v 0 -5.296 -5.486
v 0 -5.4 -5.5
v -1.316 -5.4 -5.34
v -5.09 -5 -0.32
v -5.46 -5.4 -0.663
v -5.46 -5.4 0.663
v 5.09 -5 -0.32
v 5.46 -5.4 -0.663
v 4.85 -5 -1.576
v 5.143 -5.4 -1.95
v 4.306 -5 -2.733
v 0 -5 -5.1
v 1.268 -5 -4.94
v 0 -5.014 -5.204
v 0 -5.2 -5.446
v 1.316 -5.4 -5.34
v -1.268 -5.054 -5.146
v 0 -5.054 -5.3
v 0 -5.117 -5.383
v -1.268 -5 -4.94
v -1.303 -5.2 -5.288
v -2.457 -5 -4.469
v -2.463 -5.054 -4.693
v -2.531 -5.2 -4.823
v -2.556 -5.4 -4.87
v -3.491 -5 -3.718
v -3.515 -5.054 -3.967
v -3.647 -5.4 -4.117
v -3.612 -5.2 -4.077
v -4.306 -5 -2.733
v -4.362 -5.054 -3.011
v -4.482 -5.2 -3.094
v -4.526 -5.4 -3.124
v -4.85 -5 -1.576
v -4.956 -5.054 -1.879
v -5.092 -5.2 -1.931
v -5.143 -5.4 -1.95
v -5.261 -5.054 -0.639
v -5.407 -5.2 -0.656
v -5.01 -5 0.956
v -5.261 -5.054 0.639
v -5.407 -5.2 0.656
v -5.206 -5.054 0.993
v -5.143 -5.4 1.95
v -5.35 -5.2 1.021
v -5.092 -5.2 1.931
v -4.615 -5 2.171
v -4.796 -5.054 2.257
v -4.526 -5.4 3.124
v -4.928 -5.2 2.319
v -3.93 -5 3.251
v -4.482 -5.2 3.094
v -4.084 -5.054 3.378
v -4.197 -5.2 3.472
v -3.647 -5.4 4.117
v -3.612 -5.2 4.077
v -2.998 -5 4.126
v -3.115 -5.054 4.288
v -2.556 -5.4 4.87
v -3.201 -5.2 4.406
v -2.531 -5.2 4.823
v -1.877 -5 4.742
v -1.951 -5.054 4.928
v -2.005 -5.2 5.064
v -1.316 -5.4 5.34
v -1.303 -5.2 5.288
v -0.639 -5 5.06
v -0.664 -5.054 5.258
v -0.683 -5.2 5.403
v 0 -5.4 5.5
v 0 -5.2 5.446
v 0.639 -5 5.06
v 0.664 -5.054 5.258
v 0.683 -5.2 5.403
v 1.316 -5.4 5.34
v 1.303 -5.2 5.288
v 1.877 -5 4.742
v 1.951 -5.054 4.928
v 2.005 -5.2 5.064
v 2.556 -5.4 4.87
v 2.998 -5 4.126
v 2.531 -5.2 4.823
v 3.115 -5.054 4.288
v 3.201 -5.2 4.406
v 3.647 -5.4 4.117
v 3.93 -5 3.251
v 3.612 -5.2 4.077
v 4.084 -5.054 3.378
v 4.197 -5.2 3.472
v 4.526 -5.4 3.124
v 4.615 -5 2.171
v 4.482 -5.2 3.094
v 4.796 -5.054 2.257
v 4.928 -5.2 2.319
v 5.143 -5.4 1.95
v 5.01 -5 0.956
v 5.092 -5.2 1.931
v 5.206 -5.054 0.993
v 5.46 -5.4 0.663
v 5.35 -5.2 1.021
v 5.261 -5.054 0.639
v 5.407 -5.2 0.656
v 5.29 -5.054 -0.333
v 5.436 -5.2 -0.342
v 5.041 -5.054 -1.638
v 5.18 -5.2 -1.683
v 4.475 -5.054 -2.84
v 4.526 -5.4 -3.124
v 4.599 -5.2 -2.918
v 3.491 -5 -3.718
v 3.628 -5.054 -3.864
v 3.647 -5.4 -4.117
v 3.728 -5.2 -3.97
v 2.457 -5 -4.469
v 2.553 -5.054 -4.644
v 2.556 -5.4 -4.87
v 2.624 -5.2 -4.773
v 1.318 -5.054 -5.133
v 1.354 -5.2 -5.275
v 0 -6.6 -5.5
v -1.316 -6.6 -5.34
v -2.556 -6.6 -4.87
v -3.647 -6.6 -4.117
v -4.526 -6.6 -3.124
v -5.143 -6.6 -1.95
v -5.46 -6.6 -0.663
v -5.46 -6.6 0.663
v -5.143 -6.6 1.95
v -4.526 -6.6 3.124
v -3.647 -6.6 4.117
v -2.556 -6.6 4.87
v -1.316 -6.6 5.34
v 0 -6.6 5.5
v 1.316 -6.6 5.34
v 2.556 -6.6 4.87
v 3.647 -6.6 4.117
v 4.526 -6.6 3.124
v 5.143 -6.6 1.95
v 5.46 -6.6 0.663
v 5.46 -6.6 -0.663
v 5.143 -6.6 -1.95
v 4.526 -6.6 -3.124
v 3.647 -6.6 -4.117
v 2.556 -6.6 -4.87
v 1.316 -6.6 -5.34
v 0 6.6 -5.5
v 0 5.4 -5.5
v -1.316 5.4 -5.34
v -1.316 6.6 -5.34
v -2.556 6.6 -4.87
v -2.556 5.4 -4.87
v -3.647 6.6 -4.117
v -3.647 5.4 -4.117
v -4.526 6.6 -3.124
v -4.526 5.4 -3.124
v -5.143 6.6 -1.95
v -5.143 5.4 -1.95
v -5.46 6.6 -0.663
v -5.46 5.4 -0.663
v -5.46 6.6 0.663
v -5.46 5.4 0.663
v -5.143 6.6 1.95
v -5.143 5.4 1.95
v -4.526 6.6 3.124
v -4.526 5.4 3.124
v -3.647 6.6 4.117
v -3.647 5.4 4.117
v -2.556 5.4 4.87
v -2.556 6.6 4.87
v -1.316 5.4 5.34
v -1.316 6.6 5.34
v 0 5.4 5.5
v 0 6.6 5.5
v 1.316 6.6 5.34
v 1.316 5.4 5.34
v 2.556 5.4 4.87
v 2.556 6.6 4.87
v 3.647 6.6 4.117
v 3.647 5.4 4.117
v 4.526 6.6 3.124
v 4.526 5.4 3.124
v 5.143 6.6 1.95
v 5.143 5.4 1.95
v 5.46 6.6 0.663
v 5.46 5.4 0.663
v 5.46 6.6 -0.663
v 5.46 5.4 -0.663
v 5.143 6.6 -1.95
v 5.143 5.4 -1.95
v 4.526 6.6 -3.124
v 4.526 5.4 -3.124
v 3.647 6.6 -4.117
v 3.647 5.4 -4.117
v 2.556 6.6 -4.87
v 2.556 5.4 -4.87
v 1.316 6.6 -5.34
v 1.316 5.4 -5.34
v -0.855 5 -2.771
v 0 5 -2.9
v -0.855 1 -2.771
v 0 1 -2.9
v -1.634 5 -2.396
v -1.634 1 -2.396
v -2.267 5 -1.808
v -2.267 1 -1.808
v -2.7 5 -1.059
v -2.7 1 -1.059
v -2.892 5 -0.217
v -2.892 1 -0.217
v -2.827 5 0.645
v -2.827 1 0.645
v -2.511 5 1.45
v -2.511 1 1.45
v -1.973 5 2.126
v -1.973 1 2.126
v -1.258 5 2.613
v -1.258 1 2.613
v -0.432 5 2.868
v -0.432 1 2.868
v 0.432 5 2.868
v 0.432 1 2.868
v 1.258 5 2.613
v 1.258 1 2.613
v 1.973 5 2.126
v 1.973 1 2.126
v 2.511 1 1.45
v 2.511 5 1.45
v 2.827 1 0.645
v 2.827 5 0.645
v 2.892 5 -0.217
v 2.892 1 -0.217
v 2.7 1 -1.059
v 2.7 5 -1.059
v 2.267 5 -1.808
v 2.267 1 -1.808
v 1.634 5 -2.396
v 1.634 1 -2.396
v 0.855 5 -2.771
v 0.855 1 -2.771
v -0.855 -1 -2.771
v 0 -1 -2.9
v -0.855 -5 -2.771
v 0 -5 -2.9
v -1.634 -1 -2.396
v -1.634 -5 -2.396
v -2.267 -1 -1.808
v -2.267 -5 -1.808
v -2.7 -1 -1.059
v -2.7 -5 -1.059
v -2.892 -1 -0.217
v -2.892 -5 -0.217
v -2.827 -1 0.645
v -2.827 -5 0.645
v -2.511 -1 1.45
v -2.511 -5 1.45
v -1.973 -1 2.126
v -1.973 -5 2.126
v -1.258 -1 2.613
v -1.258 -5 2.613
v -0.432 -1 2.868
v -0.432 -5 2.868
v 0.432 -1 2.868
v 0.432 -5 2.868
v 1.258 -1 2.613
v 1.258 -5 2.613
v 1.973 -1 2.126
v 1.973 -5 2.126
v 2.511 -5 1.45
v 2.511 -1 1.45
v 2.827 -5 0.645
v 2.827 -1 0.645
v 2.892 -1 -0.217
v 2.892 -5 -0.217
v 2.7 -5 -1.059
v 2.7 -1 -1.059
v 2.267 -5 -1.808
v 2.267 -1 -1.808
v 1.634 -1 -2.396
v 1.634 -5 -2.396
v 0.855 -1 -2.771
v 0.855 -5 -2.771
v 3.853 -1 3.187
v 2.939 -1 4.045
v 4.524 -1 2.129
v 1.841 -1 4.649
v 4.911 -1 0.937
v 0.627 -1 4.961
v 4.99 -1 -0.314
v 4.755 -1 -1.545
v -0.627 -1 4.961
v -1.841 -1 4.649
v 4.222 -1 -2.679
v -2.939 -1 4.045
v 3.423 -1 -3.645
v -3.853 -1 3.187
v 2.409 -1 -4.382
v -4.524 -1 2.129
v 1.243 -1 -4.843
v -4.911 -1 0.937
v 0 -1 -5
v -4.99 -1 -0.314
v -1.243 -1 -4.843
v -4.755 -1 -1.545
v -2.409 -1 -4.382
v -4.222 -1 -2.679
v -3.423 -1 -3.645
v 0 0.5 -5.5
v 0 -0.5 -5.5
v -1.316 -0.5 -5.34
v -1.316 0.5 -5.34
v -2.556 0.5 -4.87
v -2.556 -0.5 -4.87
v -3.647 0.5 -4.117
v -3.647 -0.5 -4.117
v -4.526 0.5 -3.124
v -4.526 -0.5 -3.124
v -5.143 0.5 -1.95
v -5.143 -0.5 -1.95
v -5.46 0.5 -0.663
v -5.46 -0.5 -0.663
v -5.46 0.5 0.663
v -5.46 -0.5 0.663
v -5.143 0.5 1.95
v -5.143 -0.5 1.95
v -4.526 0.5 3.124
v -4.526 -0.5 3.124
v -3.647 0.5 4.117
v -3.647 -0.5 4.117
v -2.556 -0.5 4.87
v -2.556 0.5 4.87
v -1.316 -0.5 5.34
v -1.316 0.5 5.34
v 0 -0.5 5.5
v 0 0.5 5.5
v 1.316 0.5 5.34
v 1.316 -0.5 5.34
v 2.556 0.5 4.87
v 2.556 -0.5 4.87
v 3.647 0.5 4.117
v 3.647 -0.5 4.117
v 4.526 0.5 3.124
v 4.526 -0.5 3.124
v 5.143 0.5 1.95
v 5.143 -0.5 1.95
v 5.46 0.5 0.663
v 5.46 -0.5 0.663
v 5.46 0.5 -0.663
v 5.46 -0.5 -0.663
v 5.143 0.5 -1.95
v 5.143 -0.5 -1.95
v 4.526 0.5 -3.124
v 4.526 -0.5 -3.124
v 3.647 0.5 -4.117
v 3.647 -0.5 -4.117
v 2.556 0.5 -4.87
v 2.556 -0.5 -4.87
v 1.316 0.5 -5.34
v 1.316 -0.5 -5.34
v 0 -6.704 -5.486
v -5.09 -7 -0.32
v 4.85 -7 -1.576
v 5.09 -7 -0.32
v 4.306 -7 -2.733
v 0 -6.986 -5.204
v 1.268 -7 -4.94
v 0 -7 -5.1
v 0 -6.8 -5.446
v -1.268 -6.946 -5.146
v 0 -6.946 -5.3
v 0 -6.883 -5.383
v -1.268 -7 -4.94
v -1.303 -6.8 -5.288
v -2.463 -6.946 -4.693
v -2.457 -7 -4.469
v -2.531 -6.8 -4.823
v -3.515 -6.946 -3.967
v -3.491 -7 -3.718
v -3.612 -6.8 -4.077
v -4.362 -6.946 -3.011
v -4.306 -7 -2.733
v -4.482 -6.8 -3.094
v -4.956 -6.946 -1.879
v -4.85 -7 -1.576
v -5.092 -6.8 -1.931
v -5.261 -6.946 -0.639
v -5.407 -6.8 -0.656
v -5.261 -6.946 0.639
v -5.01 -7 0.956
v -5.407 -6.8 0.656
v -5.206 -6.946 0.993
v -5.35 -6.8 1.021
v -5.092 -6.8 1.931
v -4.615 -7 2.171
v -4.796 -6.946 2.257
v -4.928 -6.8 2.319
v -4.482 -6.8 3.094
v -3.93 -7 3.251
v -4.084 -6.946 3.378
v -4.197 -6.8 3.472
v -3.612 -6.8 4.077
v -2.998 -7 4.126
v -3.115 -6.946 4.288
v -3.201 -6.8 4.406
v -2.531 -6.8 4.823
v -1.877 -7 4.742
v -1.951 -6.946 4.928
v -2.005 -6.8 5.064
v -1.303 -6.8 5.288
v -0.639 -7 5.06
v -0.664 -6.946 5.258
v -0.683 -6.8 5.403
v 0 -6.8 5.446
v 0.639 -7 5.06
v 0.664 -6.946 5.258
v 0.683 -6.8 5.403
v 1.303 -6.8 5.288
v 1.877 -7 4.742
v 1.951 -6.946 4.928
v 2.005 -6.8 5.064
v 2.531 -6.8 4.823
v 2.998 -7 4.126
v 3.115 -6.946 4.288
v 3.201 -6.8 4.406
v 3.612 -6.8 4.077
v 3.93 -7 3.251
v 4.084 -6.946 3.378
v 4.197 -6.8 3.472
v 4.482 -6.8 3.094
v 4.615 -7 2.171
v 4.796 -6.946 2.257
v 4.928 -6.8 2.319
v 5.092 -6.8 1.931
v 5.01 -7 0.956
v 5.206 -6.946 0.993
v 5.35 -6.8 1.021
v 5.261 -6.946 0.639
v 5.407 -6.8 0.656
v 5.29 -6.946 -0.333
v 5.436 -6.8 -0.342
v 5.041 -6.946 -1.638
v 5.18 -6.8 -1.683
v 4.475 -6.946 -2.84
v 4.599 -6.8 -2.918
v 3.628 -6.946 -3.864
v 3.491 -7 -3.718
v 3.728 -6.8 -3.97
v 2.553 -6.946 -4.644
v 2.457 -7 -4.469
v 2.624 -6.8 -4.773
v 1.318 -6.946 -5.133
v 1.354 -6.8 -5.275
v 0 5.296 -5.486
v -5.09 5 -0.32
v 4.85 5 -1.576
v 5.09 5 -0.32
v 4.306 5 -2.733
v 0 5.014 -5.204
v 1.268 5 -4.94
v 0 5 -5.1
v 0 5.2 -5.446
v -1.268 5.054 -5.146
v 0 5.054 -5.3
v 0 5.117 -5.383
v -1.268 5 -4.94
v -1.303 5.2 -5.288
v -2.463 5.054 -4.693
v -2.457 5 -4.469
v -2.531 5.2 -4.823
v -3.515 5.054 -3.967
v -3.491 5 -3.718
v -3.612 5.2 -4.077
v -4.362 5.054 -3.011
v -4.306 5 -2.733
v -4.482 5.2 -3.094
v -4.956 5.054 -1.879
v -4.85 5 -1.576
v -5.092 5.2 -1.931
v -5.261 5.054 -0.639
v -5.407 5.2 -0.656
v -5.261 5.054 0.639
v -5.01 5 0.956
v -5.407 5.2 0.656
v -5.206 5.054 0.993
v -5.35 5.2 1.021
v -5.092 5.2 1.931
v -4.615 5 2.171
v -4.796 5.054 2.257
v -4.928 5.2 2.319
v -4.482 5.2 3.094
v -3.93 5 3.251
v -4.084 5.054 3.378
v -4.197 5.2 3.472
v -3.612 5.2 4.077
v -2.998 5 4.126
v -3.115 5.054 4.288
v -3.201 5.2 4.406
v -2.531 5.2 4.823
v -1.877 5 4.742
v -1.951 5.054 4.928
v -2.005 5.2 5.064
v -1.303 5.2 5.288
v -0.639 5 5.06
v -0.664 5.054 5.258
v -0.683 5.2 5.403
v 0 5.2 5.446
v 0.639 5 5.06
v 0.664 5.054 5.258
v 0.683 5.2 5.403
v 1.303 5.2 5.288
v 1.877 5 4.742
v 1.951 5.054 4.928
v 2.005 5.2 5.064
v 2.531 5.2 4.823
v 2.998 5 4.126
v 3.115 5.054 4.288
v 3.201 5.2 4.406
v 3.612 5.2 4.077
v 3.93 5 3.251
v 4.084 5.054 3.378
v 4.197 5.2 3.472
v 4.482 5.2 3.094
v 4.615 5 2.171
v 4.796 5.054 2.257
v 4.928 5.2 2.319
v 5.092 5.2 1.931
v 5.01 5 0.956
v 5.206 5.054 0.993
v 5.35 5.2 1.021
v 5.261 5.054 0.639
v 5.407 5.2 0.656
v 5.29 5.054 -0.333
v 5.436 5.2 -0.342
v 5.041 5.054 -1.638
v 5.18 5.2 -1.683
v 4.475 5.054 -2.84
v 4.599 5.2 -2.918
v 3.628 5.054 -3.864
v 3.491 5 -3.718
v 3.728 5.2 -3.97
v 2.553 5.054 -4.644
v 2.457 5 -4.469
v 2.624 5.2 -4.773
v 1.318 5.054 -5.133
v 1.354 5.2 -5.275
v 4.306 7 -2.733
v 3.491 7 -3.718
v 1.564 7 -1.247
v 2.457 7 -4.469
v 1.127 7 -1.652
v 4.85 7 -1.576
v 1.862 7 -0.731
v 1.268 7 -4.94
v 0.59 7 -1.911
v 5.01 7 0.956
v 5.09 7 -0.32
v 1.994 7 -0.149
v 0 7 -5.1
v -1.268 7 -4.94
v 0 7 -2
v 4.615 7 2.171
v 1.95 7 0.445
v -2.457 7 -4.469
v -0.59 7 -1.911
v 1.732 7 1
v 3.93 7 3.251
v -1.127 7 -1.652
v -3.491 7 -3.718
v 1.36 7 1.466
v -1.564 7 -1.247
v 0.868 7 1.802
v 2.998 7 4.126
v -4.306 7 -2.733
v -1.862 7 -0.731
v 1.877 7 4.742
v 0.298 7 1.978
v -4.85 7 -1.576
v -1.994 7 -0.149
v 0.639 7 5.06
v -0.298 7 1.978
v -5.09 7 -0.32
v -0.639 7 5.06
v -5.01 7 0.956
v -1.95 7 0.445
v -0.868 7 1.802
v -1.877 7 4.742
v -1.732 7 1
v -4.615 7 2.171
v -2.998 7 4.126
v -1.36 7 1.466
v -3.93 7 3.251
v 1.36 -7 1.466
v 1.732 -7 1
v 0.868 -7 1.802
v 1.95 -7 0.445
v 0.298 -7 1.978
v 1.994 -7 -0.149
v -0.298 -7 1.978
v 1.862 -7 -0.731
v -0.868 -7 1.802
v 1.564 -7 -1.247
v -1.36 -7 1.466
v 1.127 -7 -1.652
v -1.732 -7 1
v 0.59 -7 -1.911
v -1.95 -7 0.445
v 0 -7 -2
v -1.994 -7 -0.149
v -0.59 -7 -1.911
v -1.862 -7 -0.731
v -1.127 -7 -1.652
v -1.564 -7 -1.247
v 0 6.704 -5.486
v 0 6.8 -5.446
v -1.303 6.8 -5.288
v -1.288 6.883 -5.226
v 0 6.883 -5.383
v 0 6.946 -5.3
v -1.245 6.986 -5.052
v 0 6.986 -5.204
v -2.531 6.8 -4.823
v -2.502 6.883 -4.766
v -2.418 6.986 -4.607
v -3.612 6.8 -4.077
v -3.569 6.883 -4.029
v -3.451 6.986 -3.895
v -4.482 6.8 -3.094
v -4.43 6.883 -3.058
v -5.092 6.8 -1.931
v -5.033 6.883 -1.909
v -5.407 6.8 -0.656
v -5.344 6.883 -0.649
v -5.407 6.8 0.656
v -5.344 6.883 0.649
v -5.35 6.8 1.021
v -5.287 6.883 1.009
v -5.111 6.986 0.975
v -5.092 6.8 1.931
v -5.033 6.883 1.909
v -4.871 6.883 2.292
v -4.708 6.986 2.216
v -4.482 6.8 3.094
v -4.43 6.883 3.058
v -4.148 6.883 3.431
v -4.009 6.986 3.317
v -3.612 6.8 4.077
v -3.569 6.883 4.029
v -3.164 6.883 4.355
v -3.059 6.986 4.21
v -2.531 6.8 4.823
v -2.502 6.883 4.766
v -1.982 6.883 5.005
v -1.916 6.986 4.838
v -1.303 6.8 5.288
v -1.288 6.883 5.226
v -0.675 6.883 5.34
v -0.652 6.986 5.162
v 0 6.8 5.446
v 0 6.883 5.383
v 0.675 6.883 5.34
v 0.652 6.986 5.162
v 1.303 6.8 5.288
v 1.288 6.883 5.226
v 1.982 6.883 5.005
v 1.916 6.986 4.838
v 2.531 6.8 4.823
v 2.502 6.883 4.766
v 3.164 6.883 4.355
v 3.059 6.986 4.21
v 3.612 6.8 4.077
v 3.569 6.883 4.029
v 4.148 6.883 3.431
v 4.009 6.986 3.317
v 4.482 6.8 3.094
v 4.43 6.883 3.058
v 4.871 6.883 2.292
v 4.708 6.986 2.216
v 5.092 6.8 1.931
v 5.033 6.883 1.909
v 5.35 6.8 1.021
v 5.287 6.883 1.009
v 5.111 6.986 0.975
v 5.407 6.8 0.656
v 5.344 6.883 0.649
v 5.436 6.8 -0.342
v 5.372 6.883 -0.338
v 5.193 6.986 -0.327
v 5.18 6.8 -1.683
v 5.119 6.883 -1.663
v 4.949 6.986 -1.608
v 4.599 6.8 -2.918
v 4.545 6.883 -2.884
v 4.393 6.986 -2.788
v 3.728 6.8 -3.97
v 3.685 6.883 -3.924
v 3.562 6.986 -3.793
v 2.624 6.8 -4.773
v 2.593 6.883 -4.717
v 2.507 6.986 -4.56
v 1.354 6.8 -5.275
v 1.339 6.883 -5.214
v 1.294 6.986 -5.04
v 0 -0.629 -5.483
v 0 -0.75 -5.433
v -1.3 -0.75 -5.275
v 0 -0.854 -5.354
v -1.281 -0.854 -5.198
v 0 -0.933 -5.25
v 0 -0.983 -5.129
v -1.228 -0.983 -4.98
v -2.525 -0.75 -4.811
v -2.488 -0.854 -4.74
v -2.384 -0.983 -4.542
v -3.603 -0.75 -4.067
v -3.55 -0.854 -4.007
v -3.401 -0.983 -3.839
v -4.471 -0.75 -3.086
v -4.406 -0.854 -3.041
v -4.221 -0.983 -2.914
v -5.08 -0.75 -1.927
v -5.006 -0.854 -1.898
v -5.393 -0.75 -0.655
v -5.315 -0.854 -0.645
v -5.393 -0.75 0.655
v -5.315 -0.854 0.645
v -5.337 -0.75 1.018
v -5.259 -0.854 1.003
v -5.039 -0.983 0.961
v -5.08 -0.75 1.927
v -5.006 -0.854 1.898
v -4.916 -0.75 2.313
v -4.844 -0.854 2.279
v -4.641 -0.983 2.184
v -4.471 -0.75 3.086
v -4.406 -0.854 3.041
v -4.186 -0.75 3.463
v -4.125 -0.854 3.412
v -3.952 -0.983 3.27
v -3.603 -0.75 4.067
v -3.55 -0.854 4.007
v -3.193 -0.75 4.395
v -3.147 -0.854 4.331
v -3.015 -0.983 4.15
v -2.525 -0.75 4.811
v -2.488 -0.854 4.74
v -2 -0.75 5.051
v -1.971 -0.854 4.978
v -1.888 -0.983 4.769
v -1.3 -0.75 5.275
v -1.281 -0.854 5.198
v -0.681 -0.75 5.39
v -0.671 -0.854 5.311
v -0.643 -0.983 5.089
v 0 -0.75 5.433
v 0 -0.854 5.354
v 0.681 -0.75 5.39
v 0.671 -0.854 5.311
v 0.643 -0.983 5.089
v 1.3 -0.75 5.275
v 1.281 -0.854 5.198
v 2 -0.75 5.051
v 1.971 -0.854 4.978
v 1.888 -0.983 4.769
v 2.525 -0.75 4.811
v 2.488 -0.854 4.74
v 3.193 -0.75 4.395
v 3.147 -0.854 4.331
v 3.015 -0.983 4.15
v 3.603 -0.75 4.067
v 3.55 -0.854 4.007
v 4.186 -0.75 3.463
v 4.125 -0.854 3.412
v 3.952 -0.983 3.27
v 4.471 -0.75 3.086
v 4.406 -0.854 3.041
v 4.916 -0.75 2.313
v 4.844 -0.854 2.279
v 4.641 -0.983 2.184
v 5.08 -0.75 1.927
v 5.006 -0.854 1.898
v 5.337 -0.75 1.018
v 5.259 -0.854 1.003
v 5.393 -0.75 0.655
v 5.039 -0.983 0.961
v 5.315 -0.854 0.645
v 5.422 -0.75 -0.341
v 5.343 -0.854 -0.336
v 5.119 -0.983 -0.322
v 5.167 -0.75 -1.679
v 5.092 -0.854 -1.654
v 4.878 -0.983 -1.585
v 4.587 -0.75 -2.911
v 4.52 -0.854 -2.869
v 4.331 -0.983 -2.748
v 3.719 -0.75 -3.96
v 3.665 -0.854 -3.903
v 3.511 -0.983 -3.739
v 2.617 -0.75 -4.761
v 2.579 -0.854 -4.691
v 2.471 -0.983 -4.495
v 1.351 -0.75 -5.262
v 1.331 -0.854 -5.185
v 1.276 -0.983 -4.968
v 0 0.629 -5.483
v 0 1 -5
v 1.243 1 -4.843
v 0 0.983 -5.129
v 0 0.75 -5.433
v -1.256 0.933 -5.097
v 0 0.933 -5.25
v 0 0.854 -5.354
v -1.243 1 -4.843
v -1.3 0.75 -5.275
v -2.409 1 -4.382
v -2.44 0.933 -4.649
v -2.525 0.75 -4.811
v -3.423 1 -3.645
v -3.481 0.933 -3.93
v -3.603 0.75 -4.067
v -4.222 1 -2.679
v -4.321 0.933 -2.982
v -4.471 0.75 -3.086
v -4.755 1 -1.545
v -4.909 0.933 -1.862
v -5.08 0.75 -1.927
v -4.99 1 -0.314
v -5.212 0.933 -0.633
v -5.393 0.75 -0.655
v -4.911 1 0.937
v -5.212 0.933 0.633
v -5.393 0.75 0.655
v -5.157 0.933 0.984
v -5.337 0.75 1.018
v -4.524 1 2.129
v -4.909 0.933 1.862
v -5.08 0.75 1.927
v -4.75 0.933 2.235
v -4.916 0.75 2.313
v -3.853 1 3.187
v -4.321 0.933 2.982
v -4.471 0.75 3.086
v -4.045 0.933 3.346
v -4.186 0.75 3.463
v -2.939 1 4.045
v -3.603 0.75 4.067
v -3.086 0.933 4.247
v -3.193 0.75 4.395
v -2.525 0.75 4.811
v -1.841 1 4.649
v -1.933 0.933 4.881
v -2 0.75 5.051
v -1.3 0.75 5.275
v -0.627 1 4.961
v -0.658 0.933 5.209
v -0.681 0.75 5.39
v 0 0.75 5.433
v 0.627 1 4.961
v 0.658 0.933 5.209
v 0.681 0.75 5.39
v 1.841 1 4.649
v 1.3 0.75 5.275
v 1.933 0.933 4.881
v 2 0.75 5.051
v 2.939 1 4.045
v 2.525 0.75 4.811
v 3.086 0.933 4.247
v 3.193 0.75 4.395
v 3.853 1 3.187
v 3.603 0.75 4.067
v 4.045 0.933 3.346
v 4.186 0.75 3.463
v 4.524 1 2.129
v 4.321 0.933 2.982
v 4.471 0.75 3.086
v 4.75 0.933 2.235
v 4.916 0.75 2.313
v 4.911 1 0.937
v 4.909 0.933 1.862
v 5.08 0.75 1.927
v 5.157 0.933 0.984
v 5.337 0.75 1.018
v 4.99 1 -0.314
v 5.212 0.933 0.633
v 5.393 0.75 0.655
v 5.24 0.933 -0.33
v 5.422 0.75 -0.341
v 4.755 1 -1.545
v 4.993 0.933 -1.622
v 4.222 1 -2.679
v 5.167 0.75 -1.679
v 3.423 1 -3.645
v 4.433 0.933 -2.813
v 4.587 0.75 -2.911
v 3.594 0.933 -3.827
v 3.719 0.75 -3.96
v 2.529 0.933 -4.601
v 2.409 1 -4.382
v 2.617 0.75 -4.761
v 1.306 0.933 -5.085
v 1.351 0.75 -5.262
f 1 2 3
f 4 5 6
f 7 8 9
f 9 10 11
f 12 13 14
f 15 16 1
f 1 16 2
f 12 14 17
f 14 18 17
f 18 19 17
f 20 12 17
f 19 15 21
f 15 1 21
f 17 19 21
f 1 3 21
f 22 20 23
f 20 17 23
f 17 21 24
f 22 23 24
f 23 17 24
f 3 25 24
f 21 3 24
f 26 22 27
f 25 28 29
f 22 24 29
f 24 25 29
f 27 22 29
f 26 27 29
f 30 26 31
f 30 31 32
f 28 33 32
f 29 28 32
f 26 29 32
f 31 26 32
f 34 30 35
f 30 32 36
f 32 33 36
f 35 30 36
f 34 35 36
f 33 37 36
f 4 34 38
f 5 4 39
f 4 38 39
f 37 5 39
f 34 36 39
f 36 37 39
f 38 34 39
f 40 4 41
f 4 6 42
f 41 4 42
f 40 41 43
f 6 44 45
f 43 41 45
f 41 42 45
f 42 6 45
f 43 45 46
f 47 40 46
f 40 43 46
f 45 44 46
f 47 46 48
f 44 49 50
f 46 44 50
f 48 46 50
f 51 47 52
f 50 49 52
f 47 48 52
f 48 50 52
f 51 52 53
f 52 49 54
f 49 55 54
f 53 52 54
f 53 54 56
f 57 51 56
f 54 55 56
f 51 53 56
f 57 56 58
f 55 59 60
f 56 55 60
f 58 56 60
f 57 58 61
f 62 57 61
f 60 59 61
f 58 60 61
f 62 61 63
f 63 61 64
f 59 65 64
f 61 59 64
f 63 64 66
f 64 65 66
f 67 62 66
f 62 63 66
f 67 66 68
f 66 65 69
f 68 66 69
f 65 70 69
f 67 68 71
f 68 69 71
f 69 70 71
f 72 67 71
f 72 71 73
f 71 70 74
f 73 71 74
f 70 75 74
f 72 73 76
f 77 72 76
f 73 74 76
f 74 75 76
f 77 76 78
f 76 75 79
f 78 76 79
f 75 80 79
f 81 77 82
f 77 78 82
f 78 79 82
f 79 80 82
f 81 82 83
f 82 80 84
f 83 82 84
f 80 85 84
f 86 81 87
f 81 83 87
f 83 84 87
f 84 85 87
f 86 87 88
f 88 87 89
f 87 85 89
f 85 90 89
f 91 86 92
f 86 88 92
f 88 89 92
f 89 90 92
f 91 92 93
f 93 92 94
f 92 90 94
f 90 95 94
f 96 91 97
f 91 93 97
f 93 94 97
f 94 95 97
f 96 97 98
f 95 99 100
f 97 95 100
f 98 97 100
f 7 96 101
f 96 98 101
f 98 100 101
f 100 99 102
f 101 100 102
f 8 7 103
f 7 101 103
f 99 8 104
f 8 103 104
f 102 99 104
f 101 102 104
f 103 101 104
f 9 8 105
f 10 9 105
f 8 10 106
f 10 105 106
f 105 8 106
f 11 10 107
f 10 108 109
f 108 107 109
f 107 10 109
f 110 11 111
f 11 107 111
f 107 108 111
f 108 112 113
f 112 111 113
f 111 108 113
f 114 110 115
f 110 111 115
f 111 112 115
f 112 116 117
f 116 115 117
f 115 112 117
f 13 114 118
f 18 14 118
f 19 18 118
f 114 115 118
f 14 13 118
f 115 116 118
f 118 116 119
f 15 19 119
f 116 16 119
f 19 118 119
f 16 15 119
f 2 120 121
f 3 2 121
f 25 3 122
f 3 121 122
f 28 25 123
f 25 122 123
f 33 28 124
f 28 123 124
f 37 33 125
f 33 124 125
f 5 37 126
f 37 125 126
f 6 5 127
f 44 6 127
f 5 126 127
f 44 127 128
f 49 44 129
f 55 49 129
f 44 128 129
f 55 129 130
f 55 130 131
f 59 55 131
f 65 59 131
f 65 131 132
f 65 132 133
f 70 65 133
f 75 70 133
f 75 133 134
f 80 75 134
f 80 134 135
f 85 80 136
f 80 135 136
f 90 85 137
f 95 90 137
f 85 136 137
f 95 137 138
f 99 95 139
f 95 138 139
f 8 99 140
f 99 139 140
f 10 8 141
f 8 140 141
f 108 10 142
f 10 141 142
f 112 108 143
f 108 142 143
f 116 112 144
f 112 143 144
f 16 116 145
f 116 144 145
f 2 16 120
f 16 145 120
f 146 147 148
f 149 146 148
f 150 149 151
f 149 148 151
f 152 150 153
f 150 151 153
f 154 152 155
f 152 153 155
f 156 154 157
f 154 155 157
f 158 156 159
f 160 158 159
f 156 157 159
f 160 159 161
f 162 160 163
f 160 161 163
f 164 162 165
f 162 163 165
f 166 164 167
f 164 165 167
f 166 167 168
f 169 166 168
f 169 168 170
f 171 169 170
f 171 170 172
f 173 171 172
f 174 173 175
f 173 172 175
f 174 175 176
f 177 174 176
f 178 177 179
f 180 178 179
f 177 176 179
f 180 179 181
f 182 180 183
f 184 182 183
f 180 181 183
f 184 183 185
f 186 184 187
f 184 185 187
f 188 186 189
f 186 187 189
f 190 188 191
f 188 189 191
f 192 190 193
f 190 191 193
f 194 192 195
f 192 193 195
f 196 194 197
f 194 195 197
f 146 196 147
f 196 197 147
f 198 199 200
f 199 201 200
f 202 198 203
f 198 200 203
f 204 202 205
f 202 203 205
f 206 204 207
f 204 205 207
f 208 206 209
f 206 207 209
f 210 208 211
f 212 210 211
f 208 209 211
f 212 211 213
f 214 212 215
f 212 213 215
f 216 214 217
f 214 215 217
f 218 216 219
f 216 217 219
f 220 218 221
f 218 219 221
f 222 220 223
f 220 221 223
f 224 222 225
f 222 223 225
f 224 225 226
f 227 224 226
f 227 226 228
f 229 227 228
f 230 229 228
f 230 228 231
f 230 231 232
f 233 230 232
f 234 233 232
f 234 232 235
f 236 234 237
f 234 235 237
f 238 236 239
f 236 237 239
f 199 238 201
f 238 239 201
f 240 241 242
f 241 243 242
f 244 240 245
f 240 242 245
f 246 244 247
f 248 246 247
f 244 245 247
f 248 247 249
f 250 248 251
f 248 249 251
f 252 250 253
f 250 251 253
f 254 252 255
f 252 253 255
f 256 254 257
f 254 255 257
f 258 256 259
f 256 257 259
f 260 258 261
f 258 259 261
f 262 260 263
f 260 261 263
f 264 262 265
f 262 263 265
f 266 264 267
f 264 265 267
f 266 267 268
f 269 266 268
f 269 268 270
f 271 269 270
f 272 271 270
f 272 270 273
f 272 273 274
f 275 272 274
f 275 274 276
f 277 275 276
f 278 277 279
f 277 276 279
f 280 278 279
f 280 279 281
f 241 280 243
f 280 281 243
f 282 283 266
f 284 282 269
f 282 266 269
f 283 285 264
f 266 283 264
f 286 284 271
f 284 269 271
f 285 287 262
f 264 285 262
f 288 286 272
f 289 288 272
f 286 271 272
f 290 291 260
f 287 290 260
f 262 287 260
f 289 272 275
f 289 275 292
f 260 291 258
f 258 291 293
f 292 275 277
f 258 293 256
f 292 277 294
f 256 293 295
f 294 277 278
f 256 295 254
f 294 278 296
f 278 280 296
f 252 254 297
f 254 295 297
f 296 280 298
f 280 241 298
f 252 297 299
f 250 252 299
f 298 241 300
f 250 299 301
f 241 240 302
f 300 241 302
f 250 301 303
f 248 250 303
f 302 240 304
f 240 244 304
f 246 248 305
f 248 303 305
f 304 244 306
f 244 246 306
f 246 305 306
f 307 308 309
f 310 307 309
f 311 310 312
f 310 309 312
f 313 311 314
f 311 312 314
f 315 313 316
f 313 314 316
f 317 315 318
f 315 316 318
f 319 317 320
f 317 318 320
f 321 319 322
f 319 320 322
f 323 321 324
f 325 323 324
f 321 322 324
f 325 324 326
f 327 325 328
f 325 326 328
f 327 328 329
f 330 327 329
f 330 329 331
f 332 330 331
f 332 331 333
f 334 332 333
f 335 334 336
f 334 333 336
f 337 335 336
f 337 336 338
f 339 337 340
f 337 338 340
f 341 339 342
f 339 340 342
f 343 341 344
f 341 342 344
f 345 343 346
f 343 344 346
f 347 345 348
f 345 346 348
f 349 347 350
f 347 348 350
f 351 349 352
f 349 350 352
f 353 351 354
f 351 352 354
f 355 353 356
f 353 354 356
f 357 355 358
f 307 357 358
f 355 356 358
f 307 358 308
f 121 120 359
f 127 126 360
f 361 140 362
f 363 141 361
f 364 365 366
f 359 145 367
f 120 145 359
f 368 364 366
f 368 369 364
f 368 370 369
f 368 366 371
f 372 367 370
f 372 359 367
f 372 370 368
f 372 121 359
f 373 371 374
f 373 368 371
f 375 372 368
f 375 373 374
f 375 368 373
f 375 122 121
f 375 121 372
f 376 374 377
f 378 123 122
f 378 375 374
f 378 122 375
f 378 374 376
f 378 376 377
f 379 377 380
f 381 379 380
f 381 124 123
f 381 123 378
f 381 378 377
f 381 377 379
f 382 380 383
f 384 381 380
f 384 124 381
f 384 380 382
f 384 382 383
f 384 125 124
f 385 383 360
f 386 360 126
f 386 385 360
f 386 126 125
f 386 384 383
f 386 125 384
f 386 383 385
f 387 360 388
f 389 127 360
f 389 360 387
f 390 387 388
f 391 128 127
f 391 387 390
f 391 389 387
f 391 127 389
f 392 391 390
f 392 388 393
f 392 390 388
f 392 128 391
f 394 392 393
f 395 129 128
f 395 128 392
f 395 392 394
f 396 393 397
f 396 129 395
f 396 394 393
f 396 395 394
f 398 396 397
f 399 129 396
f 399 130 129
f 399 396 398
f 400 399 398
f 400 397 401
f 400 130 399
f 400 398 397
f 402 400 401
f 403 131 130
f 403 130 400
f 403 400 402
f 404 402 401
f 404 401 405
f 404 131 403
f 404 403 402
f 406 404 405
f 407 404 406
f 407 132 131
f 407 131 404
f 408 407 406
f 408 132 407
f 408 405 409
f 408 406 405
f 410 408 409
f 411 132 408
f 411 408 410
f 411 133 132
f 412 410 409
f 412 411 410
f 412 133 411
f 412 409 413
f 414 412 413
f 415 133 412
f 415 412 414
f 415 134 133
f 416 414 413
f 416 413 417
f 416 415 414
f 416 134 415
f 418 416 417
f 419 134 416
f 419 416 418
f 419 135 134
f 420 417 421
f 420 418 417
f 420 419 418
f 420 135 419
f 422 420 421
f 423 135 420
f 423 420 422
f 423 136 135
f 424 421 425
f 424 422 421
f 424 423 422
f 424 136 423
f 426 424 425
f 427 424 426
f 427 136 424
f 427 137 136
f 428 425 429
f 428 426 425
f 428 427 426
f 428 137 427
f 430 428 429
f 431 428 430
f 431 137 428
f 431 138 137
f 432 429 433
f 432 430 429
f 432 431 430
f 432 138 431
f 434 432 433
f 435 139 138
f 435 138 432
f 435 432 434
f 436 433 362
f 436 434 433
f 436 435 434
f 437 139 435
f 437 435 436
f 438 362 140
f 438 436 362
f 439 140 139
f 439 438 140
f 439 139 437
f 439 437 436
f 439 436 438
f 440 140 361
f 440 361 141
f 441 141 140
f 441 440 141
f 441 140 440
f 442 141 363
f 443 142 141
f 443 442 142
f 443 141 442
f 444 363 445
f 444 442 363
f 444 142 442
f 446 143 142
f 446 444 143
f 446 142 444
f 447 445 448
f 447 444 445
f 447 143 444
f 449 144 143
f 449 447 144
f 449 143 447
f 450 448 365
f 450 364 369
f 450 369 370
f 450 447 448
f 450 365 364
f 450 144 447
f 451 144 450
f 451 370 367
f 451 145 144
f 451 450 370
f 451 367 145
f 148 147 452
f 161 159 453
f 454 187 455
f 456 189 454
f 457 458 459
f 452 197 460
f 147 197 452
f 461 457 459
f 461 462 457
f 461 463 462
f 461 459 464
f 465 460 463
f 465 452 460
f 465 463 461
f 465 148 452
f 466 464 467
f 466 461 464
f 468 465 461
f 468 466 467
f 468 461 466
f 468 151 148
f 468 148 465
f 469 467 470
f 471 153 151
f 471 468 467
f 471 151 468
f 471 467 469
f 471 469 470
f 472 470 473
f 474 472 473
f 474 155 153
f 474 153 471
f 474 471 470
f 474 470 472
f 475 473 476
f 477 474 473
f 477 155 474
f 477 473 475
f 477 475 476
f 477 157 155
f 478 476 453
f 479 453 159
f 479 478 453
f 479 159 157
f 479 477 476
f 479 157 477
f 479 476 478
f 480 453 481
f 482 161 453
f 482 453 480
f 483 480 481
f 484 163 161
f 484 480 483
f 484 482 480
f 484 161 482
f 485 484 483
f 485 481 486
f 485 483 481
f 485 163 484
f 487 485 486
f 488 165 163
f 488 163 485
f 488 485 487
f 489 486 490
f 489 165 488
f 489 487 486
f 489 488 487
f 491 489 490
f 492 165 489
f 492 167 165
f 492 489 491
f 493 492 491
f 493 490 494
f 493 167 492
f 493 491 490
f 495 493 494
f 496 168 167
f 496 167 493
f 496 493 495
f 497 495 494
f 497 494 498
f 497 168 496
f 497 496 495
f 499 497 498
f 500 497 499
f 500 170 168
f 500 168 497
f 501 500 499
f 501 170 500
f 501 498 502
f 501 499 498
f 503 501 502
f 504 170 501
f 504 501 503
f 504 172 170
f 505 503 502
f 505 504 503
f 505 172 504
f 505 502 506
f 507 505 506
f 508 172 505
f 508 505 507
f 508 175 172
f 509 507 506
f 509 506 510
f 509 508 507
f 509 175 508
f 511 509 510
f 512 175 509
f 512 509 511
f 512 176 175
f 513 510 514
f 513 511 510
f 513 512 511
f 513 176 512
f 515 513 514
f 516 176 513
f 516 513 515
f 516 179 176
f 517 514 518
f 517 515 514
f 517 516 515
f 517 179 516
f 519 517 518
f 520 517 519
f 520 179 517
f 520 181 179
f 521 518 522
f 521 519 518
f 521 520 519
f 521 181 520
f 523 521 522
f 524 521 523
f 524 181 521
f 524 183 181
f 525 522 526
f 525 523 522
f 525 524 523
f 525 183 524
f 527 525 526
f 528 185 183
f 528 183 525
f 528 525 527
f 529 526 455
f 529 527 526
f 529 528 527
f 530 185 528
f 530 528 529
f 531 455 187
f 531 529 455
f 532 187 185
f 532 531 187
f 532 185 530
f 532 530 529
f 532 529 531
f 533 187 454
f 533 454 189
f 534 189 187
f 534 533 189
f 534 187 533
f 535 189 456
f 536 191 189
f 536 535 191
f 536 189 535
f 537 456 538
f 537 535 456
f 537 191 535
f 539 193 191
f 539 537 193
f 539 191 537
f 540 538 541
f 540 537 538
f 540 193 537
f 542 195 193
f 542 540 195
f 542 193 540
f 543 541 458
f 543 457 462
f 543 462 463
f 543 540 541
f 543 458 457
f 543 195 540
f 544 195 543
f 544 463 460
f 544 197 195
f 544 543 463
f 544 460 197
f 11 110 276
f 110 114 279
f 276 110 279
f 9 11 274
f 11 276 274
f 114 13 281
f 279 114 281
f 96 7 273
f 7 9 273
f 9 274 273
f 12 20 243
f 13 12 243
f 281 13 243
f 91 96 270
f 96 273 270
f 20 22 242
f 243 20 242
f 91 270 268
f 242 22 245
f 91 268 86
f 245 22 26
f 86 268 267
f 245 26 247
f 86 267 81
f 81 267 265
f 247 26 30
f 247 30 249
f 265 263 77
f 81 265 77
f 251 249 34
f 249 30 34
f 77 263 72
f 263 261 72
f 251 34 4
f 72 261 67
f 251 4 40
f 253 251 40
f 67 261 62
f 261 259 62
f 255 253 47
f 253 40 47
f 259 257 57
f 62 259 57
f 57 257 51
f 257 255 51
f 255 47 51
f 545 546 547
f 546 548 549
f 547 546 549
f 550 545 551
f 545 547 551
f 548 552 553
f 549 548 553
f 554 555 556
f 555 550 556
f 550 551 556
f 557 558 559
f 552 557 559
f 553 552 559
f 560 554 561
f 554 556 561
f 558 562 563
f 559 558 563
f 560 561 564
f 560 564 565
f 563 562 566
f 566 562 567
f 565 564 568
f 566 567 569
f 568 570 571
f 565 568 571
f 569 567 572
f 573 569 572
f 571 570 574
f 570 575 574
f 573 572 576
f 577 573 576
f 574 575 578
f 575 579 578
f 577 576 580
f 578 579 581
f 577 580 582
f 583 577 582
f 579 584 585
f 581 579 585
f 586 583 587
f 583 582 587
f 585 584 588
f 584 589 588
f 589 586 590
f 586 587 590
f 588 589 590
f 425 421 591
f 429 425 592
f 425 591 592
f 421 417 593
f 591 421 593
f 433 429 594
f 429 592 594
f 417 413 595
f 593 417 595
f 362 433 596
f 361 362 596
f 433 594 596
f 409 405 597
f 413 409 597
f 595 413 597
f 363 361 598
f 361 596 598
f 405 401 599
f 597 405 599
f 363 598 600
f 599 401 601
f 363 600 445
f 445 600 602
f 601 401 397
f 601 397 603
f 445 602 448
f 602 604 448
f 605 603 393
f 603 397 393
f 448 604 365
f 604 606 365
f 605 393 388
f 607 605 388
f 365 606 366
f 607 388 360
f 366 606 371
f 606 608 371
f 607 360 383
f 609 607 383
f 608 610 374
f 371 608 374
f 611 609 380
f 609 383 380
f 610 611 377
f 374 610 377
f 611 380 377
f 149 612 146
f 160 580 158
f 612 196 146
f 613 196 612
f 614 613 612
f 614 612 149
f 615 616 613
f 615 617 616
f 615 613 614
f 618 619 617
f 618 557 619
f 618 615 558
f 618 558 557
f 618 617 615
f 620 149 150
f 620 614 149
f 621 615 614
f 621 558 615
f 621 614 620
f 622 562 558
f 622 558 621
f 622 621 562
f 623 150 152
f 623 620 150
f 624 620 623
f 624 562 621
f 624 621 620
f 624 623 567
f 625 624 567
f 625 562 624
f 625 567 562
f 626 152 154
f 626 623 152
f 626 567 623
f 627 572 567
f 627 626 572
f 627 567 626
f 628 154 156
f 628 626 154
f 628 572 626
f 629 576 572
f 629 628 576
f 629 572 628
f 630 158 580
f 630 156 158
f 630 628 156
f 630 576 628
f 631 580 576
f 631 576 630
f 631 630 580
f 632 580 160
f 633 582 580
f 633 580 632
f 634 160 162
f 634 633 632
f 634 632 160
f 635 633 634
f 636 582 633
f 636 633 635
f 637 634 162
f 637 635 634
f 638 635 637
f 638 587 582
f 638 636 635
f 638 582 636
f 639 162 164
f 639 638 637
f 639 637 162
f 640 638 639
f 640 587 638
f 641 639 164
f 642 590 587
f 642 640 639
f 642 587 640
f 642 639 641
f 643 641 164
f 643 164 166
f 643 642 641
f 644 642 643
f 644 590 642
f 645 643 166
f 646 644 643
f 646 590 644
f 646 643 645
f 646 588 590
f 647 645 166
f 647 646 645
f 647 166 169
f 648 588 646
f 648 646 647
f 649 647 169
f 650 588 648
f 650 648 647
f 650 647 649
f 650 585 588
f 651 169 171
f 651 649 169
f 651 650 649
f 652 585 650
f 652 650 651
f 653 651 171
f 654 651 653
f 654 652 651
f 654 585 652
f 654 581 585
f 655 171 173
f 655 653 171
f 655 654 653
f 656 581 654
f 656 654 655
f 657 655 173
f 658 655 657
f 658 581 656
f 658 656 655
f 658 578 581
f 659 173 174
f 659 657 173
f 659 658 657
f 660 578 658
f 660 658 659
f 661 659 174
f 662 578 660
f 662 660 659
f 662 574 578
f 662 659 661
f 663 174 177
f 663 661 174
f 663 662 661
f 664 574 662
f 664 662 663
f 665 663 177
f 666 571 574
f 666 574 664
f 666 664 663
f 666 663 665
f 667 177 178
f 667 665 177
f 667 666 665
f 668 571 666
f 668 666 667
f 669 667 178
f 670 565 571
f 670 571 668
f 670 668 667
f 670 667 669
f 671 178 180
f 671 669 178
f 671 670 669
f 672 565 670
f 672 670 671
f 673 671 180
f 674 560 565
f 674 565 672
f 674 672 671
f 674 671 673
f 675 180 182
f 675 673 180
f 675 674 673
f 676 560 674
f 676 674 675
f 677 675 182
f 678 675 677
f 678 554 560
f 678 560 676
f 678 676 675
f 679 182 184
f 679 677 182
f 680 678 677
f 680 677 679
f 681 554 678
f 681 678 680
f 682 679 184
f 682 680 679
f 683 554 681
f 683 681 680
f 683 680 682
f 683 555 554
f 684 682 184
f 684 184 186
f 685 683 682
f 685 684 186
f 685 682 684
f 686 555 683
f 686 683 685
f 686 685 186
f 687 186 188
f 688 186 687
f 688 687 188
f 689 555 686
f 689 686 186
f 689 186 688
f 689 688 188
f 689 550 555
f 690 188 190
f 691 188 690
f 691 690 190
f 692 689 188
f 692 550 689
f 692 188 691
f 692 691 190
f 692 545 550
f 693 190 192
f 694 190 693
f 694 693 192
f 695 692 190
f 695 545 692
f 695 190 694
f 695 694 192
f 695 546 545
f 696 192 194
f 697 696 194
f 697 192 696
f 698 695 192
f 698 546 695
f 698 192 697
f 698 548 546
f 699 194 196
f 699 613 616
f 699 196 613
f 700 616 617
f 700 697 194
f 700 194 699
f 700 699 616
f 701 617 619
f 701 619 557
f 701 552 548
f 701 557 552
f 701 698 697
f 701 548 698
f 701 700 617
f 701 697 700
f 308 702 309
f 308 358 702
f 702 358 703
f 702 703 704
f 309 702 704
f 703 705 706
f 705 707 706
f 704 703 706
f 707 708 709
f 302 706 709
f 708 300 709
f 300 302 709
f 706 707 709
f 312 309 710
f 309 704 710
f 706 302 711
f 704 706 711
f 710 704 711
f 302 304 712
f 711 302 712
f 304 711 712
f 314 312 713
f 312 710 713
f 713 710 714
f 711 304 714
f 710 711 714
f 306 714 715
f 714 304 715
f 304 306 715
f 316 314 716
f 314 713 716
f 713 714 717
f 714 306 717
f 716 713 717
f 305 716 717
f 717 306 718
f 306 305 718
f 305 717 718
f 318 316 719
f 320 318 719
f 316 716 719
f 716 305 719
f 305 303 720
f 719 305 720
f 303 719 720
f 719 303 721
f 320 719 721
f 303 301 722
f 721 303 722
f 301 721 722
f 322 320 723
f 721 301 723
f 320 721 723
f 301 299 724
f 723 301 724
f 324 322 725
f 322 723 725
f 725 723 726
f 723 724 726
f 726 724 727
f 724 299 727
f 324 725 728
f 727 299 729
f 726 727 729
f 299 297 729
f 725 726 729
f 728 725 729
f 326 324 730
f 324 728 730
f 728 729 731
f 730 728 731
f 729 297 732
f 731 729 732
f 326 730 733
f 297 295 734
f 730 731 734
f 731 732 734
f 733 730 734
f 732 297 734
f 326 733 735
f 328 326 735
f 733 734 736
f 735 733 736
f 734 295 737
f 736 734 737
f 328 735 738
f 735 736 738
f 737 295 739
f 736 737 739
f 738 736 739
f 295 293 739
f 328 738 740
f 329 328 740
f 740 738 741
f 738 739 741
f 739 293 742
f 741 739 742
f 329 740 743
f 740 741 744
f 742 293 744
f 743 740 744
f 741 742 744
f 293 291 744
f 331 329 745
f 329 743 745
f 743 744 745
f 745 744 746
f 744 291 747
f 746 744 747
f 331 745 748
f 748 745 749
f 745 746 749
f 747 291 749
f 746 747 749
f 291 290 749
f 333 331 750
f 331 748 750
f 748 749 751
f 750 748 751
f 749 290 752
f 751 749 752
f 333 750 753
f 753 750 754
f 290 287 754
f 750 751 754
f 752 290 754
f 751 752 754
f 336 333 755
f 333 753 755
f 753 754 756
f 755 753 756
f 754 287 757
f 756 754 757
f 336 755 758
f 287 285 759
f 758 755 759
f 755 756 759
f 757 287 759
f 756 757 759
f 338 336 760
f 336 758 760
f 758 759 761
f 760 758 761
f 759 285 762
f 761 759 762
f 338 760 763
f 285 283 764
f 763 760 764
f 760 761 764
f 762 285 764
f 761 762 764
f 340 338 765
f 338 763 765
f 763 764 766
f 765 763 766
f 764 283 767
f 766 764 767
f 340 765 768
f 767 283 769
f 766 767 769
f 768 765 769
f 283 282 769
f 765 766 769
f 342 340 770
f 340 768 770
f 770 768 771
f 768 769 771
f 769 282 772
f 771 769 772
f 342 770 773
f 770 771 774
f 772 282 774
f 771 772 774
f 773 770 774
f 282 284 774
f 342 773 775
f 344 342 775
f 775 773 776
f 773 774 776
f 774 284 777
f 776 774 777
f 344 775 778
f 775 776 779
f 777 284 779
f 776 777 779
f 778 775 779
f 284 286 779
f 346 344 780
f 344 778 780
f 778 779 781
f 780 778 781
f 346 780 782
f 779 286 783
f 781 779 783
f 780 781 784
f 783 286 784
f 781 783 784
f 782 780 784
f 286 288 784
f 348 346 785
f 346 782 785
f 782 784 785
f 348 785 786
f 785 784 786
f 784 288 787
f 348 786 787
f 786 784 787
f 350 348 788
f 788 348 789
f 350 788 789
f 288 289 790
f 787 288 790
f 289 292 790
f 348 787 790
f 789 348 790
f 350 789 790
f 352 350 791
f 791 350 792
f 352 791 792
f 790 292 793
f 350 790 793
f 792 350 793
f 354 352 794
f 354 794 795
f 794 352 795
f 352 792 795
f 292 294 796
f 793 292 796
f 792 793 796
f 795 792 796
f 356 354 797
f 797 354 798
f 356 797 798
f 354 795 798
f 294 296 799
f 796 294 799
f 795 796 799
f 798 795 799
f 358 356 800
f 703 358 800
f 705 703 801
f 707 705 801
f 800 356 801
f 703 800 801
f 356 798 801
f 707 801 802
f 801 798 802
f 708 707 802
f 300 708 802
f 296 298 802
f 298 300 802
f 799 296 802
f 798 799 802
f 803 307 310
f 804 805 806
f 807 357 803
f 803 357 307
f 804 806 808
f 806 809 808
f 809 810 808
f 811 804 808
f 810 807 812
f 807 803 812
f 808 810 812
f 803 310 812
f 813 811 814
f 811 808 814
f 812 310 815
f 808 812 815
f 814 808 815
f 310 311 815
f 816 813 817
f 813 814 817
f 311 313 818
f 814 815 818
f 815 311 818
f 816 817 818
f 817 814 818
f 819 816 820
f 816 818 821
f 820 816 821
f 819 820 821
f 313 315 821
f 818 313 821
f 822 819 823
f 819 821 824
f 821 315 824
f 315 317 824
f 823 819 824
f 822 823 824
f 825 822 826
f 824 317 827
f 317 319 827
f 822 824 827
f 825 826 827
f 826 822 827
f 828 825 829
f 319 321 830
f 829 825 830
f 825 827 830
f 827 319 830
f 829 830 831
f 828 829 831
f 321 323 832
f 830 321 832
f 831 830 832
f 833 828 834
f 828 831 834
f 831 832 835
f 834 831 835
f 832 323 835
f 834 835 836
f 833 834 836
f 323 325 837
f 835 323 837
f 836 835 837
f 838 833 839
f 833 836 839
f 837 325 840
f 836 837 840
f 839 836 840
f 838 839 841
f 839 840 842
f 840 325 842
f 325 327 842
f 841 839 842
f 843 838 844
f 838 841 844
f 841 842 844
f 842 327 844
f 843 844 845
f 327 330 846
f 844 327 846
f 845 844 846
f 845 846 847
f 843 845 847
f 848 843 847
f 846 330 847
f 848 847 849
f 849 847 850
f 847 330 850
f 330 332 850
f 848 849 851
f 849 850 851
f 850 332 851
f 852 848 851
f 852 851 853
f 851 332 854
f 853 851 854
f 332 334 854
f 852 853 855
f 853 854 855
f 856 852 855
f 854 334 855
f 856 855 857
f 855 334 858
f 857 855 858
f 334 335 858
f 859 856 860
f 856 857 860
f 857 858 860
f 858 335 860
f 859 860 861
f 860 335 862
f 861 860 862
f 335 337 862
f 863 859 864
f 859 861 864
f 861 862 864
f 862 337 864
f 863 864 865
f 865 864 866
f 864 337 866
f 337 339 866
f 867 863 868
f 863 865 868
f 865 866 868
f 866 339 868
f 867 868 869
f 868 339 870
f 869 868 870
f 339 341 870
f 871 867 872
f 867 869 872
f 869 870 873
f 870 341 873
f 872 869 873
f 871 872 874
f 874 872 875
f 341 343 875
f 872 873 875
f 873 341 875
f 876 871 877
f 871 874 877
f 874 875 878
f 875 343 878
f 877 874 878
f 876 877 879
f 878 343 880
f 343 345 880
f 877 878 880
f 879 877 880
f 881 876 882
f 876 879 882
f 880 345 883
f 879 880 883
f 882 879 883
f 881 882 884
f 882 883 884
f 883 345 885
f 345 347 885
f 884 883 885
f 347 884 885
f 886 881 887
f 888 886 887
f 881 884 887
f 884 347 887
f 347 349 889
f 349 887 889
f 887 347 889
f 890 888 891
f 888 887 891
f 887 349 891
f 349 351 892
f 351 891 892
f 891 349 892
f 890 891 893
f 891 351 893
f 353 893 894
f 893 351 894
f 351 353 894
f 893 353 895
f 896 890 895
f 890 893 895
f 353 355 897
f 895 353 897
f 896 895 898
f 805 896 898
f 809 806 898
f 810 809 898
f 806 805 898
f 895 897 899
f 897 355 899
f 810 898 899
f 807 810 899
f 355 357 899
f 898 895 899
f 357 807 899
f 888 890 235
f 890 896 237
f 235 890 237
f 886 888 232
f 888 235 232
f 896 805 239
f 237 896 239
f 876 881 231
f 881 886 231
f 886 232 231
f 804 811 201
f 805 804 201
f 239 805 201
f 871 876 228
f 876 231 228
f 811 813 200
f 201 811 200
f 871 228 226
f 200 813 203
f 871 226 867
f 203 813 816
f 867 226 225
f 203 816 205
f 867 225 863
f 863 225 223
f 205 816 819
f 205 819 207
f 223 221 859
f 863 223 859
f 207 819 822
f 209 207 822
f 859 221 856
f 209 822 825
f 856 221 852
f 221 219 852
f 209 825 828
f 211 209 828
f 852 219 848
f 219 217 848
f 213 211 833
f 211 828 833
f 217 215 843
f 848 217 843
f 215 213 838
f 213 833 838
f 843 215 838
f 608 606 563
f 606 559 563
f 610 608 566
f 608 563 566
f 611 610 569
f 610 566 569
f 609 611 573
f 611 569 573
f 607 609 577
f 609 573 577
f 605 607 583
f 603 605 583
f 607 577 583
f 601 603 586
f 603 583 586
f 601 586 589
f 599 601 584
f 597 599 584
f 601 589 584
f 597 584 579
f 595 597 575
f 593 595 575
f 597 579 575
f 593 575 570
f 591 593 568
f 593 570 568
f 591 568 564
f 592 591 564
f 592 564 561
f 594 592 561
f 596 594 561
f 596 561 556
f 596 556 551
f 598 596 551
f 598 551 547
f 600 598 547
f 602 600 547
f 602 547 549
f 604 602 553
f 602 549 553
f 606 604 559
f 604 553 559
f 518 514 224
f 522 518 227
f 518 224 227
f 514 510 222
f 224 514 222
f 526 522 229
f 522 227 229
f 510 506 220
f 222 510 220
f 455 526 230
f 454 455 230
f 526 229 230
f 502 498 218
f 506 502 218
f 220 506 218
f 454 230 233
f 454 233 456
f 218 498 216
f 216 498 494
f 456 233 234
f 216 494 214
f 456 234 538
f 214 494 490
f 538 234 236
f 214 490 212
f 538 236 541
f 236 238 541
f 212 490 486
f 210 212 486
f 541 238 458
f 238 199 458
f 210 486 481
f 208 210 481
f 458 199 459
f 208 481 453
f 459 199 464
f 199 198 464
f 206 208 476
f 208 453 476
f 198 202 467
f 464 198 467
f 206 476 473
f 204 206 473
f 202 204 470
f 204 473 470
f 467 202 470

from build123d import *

# Parameters (mm, degrees)
FILLET_1_R = 0.5
FILLET_2_R = 0.4


with BuildPart() as part:
    # 草图1 → 旋转1 (revolve)
    with BuildSketch(Plane.XY, mode=Mode.PRIVATE) as revolve_1_sk:
        Polygon((2, 7), (5.5, 7), (5.5, 5), (2.9, 5), (2.9, 1), (5.5, 1), (5.5, -1), (2.9, -1), (2.9, -5), (5.5, -5), (5.5, -7), (2, -7), align=None)
    revolve(revolve_1_sk.sketch.rotate(Axis((0, -9.632847305, 0), (0, 1, 0)), 90), axis=Axis((0, -9.632847305, 0), (0, 1, 0)))

    # 圆角1
    fillet_1_edges = [part.edges().sort_by_distance(p)[0] for p in [
        (0, 1, 5.5),
        (0, -1, 5.5),
    ]]
    fillet(fillet_1_edges, radius=FILLET_1_R)

    # 圆角2
    fillet_2_edges = [part.edges().sort_by_distance(p)[0] for p in [
        (0, 5, 5.5),
        (0, -5, 5.5),
        (0, -7, 5.5),
        (0, 7, 5.5),
    ]]
    fillet(fillet_2_edges, radius=FILLET_2_R)


solid = part.part
